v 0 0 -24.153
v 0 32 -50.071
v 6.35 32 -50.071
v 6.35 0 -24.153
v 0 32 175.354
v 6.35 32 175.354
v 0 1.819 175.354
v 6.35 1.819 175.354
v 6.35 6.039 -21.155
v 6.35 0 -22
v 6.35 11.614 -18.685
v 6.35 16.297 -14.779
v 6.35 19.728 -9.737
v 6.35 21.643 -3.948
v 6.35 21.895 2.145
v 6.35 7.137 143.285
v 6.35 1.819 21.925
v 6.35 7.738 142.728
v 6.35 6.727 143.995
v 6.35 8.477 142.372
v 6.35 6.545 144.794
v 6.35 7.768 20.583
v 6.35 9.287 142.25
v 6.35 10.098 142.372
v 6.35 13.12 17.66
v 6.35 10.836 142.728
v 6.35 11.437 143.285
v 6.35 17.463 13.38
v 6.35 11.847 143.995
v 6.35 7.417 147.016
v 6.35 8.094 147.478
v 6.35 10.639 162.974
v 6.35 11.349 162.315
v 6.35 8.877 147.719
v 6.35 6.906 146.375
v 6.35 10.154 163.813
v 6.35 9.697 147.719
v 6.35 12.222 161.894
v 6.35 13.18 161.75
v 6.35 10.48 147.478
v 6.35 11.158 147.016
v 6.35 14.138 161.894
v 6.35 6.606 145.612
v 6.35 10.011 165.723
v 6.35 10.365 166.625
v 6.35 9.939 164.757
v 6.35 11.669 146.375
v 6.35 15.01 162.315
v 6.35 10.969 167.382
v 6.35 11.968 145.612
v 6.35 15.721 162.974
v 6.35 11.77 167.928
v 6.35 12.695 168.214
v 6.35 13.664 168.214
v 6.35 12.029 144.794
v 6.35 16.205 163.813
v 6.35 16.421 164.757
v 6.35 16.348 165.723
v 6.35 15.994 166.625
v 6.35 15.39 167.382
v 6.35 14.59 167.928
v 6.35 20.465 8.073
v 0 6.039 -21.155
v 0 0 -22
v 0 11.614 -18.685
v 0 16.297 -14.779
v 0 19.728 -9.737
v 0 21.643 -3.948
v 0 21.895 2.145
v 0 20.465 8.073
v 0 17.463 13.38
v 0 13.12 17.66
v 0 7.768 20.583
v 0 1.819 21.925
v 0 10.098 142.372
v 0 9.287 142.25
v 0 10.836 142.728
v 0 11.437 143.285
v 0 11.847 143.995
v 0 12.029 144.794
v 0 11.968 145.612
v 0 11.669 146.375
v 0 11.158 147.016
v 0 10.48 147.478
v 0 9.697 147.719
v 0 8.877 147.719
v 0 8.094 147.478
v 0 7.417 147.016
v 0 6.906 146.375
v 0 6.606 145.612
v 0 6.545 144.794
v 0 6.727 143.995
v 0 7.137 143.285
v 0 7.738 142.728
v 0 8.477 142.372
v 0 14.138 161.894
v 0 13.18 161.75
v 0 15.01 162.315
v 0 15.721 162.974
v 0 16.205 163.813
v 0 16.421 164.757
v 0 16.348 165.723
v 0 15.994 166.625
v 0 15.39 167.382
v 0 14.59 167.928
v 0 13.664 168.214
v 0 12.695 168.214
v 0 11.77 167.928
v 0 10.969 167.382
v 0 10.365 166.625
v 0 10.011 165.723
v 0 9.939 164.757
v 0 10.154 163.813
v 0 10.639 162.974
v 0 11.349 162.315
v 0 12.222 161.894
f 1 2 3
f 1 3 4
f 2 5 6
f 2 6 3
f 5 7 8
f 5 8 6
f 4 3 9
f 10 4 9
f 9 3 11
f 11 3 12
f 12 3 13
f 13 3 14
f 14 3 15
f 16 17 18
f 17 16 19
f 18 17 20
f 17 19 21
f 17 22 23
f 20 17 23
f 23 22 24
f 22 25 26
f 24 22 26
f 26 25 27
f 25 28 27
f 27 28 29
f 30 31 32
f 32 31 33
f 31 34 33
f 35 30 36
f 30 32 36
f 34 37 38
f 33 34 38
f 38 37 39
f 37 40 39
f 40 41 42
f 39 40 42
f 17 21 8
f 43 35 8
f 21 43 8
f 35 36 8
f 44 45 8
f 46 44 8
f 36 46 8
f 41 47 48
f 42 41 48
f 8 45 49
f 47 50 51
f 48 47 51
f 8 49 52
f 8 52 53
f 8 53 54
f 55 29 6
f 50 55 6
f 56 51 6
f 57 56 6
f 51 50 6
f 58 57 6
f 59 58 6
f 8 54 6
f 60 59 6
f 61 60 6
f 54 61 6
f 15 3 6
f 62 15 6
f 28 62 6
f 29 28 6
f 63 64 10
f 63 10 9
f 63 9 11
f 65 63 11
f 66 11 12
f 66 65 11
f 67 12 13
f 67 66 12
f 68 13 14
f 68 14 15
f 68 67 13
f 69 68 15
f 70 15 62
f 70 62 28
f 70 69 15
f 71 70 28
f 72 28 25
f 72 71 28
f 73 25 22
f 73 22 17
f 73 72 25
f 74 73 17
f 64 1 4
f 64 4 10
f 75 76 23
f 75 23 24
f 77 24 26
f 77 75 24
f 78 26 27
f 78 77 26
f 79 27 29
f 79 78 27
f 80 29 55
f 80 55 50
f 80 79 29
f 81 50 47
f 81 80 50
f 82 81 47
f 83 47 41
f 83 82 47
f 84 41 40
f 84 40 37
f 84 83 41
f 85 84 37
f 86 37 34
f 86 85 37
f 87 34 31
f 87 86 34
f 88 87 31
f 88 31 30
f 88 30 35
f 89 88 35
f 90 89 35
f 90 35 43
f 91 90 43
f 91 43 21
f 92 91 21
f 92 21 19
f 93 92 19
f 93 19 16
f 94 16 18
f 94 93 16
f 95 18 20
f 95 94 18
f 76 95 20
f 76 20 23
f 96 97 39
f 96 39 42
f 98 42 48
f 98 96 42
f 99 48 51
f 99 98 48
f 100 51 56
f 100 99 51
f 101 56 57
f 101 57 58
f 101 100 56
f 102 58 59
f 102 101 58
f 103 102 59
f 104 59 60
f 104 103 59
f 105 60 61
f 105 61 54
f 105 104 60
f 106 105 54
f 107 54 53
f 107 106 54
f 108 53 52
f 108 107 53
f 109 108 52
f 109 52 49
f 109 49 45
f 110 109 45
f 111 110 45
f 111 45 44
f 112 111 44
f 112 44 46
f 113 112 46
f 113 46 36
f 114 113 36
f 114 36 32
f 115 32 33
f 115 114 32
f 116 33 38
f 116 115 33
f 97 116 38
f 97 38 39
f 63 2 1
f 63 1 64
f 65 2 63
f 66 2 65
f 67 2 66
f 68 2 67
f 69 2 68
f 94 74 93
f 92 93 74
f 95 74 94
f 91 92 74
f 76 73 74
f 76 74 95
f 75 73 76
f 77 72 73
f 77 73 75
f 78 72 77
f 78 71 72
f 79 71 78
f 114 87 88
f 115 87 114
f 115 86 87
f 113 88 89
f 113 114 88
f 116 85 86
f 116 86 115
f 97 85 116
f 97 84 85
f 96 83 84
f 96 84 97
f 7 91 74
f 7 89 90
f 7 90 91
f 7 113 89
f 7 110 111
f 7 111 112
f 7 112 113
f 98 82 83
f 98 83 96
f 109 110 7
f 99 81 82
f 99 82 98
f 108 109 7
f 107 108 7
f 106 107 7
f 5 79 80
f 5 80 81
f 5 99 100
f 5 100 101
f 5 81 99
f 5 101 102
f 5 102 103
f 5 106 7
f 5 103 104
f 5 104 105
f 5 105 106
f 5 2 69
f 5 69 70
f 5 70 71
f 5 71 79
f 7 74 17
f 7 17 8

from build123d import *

# Parameters (mm, degrees)
SKETCH1_R           = 3.25
SKETCH1_R_2         = 2.75
BOSS_EXTRUDE1_DEPTH = 6.35


with BuildPart() as part:
    # Sketch1 → Boss-Extrude1 (new body)
    with BuildSketch(Plane(origin=(0, 0, 0), x_dir=(0, 0, -1), z_dir=(1, 0, 0))):
        with BuildLine():
            Line((-175.353584658, 32), (50.071343536, 32))
            Line((50.071343536, 32), (24.152715011, 0))
            Line((24.152715011, 0), (22, 0))
            ThreePointArc((22, 0), (0.91041892, 21.981154141), (-21.924648854, 1.819278055))
            Line((-21.924648854, 1.819278055), (-175.353584658, 1.819278055))
            Line((-175.353584658, 1.819278055), (-175.353584658, 32))
        make_face()
        with Locations((-165, 13.1796749)):
            Circle(SKETCH1_R, mode=Mode.SUBTRACT)
        with Locations((-145, 9.287146811)):
            Circle(SKETCH1_R_2, mode=Mode.SUBTRACT)
    extrude(amount=BOSS_EXTRUDE1_DEPTH)


solid = part.part
